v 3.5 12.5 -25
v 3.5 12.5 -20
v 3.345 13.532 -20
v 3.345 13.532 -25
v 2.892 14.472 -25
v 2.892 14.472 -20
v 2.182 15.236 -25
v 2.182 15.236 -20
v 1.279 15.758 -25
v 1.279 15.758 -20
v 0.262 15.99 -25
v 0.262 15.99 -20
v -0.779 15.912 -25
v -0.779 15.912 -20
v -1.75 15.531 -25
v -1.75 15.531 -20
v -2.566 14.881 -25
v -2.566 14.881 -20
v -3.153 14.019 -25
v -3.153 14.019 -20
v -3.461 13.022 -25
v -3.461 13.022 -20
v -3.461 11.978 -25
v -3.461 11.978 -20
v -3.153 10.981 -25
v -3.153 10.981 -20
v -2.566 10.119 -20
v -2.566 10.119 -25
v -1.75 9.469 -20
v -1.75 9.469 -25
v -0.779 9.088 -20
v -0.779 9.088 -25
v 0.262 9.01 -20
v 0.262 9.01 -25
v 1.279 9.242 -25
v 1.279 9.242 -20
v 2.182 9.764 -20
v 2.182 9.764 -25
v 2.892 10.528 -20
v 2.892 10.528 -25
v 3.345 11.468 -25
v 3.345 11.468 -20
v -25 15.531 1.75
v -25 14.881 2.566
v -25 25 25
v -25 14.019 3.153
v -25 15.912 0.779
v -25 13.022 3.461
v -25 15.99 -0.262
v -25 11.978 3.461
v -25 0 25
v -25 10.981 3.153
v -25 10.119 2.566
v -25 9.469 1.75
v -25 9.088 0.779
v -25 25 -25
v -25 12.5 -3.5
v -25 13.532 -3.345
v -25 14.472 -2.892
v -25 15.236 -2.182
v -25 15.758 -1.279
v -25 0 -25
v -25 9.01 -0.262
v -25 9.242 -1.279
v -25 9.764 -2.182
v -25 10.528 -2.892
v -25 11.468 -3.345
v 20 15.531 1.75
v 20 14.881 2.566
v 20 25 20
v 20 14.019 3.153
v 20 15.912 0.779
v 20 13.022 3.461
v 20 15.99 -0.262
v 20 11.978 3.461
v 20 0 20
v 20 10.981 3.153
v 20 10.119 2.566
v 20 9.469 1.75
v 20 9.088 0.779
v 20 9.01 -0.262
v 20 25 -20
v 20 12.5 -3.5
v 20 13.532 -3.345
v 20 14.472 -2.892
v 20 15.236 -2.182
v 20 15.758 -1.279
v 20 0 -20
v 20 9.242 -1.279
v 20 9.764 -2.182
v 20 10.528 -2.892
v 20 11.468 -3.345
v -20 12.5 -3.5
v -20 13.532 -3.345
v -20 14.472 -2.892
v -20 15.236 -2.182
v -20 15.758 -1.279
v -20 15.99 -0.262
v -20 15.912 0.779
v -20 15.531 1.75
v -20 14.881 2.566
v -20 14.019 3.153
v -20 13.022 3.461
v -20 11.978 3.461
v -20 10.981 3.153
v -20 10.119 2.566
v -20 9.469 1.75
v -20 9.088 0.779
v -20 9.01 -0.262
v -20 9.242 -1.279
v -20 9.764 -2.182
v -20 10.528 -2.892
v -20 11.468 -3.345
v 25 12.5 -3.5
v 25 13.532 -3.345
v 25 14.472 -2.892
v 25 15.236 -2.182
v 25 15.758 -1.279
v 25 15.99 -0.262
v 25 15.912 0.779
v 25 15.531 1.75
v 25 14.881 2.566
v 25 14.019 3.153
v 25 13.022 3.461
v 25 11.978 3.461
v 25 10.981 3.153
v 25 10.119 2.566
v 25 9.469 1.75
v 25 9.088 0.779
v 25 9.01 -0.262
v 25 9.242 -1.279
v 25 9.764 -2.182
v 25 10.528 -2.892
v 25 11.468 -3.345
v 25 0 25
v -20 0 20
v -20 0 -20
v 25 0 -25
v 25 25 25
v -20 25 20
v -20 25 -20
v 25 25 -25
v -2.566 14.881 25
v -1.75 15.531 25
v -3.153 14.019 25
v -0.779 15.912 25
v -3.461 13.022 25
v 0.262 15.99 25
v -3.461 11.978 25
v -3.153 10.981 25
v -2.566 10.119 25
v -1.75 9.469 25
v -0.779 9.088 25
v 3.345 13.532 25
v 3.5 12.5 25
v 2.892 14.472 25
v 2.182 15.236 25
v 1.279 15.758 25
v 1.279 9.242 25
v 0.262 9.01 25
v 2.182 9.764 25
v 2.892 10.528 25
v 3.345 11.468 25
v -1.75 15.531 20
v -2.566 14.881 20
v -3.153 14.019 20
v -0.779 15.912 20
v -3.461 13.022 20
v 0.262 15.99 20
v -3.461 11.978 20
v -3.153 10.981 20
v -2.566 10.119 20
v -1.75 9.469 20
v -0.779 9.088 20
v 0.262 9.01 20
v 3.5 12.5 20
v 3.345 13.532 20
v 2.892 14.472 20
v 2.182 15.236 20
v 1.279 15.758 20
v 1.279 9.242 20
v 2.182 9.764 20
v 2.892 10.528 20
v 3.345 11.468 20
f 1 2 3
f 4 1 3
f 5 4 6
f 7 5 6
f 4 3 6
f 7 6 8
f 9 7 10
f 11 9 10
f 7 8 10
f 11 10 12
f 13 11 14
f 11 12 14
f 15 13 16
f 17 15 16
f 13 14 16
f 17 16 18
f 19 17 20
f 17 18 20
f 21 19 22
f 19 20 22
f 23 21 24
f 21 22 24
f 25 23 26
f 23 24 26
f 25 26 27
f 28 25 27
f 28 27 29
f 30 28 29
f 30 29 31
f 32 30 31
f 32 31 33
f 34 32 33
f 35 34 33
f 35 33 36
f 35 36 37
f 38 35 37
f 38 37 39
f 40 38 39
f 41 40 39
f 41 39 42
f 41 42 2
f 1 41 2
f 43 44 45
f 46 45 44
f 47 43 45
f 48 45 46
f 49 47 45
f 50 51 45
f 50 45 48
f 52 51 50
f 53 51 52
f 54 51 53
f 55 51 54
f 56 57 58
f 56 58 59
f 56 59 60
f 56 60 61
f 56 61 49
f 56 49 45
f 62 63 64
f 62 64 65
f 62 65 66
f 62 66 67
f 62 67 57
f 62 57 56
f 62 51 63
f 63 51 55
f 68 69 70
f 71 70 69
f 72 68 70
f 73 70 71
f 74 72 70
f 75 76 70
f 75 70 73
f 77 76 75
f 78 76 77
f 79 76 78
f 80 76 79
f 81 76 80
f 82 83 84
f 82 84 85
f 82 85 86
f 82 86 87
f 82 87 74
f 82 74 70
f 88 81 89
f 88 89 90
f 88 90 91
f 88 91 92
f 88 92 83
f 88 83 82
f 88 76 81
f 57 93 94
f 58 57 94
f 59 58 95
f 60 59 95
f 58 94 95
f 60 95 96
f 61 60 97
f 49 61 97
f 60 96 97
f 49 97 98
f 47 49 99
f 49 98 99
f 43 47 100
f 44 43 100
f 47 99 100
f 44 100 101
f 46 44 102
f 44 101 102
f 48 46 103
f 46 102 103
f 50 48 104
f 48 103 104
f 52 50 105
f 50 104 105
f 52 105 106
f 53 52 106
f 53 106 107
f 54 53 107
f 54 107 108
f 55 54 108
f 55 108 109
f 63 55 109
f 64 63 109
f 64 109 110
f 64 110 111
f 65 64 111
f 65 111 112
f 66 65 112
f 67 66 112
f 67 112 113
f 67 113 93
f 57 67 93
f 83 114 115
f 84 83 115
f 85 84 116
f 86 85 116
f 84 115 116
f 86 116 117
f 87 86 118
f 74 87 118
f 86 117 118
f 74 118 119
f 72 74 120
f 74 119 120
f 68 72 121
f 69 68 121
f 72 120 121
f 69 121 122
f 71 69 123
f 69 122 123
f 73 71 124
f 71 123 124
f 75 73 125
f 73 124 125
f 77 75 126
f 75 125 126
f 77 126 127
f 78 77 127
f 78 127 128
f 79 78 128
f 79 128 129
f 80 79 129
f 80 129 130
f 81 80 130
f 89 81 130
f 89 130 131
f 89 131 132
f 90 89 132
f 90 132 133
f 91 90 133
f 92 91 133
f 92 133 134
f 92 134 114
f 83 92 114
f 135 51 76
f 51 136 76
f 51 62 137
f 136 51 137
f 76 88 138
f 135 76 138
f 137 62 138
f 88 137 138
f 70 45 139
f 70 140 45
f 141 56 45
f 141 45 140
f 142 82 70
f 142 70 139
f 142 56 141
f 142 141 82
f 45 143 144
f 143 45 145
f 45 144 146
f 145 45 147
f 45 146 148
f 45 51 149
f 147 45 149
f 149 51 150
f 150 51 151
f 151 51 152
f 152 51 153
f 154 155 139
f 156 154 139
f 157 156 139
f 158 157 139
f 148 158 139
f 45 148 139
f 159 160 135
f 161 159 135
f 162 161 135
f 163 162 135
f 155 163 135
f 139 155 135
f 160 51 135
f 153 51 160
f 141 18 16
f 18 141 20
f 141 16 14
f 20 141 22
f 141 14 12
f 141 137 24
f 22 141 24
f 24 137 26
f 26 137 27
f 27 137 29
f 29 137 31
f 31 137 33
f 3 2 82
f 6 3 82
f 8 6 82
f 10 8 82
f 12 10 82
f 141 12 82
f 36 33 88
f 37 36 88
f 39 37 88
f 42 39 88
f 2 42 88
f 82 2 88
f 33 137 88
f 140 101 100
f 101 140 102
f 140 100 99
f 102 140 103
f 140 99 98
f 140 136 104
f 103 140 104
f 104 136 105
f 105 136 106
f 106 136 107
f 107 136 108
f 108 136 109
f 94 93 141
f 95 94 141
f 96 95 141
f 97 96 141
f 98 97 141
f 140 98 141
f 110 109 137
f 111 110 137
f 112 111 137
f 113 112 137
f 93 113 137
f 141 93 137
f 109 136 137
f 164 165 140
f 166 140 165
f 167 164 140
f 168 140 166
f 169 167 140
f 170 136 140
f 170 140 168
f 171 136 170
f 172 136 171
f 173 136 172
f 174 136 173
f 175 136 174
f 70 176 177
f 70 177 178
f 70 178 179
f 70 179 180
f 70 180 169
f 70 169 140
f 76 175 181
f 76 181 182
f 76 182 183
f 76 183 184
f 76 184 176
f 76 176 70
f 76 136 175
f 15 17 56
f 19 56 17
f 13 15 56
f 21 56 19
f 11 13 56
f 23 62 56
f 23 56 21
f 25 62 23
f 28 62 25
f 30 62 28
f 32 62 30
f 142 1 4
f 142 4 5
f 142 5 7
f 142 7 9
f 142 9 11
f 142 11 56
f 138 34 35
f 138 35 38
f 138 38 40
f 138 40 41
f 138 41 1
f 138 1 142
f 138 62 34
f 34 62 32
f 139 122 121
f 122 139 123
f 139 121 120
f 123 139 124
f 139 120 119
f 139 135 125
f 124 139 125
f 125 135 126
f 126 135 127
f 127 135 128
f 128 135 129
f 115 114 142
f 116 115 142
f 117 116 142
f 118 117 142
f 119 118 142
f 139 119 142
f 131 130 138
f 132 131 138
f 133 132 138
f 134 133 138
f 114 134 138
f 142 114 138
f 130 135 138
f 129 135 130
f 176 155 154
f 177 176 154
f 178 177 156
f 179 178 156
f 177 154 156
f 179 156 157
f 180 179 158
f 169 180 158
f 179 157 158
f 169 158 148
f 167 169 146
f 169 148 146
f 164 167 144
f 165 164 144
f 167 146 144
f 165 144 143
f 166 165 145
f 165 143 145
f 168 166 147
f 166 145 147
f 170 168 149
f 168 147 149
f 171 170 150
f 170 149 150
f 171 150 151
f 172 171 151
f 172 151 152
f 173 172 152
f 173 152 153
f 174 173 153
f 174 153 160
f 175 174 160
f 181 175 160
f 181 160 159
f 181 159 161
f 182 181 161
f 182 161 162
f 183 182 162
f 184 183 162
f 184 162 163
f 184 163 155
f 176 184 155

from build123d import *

# Parameters (mm, degrees)
SKETCH1_W           = 50
SKETCH1_H           = 50
SKETCH1_W_2         = 40
SKETCH1_H_2         = 40
BOSS_EXTRUDE1_DEPTH = 25
SKETCH2_R           = 3.5
CUT_EXTRUDE1_DEPTH  = 55
SKETCH3_R           = 3.5
CUT_EXTRUDE2_DEPTH  = 55


with BuildPart() as part:
    # Sketch1 → Boss-Extrude1 (new body)
    with BuildSketch(Plane(origin=(0, 0, 0), x_dir=(1, 0, 0), z_dir=(0, 1, 0))):
        Rectangle(SKETCH1_W, SKETCH1_H)
        Rectangle(SKETCH1_W_2, SKETCH1_H_2, mode=Mode.SUBTRACT)
    extrude(amount=BOSS_EXTRUDE1_DEPTH)

    # Sketch2 → Cut-Extrude1 (cut)
    with BuildSketch(Plane(origin=(25, 0, 0), x_dir=(0, 0, -1), z_dir=(1, 0, 0))):
        with Locations((0, 12.5)):
            Circle(SKETCH2_R)
    extrude(amount=-CUT_EXTRUDE1_DEPTH, mode=Mode.SUBTRACT)

    # Sketch3 → Cut-Extrude2 (cut)
    with BuildSketch(Plane.XY.offset(25)):
        with Locations((0, 12.5)):
            Circle(SKETCH3_R)
    extrude(amount=-CUT_EXTRUDE2_DEPTH, mode=Mode.SUBTRACT)


solid = part.part
